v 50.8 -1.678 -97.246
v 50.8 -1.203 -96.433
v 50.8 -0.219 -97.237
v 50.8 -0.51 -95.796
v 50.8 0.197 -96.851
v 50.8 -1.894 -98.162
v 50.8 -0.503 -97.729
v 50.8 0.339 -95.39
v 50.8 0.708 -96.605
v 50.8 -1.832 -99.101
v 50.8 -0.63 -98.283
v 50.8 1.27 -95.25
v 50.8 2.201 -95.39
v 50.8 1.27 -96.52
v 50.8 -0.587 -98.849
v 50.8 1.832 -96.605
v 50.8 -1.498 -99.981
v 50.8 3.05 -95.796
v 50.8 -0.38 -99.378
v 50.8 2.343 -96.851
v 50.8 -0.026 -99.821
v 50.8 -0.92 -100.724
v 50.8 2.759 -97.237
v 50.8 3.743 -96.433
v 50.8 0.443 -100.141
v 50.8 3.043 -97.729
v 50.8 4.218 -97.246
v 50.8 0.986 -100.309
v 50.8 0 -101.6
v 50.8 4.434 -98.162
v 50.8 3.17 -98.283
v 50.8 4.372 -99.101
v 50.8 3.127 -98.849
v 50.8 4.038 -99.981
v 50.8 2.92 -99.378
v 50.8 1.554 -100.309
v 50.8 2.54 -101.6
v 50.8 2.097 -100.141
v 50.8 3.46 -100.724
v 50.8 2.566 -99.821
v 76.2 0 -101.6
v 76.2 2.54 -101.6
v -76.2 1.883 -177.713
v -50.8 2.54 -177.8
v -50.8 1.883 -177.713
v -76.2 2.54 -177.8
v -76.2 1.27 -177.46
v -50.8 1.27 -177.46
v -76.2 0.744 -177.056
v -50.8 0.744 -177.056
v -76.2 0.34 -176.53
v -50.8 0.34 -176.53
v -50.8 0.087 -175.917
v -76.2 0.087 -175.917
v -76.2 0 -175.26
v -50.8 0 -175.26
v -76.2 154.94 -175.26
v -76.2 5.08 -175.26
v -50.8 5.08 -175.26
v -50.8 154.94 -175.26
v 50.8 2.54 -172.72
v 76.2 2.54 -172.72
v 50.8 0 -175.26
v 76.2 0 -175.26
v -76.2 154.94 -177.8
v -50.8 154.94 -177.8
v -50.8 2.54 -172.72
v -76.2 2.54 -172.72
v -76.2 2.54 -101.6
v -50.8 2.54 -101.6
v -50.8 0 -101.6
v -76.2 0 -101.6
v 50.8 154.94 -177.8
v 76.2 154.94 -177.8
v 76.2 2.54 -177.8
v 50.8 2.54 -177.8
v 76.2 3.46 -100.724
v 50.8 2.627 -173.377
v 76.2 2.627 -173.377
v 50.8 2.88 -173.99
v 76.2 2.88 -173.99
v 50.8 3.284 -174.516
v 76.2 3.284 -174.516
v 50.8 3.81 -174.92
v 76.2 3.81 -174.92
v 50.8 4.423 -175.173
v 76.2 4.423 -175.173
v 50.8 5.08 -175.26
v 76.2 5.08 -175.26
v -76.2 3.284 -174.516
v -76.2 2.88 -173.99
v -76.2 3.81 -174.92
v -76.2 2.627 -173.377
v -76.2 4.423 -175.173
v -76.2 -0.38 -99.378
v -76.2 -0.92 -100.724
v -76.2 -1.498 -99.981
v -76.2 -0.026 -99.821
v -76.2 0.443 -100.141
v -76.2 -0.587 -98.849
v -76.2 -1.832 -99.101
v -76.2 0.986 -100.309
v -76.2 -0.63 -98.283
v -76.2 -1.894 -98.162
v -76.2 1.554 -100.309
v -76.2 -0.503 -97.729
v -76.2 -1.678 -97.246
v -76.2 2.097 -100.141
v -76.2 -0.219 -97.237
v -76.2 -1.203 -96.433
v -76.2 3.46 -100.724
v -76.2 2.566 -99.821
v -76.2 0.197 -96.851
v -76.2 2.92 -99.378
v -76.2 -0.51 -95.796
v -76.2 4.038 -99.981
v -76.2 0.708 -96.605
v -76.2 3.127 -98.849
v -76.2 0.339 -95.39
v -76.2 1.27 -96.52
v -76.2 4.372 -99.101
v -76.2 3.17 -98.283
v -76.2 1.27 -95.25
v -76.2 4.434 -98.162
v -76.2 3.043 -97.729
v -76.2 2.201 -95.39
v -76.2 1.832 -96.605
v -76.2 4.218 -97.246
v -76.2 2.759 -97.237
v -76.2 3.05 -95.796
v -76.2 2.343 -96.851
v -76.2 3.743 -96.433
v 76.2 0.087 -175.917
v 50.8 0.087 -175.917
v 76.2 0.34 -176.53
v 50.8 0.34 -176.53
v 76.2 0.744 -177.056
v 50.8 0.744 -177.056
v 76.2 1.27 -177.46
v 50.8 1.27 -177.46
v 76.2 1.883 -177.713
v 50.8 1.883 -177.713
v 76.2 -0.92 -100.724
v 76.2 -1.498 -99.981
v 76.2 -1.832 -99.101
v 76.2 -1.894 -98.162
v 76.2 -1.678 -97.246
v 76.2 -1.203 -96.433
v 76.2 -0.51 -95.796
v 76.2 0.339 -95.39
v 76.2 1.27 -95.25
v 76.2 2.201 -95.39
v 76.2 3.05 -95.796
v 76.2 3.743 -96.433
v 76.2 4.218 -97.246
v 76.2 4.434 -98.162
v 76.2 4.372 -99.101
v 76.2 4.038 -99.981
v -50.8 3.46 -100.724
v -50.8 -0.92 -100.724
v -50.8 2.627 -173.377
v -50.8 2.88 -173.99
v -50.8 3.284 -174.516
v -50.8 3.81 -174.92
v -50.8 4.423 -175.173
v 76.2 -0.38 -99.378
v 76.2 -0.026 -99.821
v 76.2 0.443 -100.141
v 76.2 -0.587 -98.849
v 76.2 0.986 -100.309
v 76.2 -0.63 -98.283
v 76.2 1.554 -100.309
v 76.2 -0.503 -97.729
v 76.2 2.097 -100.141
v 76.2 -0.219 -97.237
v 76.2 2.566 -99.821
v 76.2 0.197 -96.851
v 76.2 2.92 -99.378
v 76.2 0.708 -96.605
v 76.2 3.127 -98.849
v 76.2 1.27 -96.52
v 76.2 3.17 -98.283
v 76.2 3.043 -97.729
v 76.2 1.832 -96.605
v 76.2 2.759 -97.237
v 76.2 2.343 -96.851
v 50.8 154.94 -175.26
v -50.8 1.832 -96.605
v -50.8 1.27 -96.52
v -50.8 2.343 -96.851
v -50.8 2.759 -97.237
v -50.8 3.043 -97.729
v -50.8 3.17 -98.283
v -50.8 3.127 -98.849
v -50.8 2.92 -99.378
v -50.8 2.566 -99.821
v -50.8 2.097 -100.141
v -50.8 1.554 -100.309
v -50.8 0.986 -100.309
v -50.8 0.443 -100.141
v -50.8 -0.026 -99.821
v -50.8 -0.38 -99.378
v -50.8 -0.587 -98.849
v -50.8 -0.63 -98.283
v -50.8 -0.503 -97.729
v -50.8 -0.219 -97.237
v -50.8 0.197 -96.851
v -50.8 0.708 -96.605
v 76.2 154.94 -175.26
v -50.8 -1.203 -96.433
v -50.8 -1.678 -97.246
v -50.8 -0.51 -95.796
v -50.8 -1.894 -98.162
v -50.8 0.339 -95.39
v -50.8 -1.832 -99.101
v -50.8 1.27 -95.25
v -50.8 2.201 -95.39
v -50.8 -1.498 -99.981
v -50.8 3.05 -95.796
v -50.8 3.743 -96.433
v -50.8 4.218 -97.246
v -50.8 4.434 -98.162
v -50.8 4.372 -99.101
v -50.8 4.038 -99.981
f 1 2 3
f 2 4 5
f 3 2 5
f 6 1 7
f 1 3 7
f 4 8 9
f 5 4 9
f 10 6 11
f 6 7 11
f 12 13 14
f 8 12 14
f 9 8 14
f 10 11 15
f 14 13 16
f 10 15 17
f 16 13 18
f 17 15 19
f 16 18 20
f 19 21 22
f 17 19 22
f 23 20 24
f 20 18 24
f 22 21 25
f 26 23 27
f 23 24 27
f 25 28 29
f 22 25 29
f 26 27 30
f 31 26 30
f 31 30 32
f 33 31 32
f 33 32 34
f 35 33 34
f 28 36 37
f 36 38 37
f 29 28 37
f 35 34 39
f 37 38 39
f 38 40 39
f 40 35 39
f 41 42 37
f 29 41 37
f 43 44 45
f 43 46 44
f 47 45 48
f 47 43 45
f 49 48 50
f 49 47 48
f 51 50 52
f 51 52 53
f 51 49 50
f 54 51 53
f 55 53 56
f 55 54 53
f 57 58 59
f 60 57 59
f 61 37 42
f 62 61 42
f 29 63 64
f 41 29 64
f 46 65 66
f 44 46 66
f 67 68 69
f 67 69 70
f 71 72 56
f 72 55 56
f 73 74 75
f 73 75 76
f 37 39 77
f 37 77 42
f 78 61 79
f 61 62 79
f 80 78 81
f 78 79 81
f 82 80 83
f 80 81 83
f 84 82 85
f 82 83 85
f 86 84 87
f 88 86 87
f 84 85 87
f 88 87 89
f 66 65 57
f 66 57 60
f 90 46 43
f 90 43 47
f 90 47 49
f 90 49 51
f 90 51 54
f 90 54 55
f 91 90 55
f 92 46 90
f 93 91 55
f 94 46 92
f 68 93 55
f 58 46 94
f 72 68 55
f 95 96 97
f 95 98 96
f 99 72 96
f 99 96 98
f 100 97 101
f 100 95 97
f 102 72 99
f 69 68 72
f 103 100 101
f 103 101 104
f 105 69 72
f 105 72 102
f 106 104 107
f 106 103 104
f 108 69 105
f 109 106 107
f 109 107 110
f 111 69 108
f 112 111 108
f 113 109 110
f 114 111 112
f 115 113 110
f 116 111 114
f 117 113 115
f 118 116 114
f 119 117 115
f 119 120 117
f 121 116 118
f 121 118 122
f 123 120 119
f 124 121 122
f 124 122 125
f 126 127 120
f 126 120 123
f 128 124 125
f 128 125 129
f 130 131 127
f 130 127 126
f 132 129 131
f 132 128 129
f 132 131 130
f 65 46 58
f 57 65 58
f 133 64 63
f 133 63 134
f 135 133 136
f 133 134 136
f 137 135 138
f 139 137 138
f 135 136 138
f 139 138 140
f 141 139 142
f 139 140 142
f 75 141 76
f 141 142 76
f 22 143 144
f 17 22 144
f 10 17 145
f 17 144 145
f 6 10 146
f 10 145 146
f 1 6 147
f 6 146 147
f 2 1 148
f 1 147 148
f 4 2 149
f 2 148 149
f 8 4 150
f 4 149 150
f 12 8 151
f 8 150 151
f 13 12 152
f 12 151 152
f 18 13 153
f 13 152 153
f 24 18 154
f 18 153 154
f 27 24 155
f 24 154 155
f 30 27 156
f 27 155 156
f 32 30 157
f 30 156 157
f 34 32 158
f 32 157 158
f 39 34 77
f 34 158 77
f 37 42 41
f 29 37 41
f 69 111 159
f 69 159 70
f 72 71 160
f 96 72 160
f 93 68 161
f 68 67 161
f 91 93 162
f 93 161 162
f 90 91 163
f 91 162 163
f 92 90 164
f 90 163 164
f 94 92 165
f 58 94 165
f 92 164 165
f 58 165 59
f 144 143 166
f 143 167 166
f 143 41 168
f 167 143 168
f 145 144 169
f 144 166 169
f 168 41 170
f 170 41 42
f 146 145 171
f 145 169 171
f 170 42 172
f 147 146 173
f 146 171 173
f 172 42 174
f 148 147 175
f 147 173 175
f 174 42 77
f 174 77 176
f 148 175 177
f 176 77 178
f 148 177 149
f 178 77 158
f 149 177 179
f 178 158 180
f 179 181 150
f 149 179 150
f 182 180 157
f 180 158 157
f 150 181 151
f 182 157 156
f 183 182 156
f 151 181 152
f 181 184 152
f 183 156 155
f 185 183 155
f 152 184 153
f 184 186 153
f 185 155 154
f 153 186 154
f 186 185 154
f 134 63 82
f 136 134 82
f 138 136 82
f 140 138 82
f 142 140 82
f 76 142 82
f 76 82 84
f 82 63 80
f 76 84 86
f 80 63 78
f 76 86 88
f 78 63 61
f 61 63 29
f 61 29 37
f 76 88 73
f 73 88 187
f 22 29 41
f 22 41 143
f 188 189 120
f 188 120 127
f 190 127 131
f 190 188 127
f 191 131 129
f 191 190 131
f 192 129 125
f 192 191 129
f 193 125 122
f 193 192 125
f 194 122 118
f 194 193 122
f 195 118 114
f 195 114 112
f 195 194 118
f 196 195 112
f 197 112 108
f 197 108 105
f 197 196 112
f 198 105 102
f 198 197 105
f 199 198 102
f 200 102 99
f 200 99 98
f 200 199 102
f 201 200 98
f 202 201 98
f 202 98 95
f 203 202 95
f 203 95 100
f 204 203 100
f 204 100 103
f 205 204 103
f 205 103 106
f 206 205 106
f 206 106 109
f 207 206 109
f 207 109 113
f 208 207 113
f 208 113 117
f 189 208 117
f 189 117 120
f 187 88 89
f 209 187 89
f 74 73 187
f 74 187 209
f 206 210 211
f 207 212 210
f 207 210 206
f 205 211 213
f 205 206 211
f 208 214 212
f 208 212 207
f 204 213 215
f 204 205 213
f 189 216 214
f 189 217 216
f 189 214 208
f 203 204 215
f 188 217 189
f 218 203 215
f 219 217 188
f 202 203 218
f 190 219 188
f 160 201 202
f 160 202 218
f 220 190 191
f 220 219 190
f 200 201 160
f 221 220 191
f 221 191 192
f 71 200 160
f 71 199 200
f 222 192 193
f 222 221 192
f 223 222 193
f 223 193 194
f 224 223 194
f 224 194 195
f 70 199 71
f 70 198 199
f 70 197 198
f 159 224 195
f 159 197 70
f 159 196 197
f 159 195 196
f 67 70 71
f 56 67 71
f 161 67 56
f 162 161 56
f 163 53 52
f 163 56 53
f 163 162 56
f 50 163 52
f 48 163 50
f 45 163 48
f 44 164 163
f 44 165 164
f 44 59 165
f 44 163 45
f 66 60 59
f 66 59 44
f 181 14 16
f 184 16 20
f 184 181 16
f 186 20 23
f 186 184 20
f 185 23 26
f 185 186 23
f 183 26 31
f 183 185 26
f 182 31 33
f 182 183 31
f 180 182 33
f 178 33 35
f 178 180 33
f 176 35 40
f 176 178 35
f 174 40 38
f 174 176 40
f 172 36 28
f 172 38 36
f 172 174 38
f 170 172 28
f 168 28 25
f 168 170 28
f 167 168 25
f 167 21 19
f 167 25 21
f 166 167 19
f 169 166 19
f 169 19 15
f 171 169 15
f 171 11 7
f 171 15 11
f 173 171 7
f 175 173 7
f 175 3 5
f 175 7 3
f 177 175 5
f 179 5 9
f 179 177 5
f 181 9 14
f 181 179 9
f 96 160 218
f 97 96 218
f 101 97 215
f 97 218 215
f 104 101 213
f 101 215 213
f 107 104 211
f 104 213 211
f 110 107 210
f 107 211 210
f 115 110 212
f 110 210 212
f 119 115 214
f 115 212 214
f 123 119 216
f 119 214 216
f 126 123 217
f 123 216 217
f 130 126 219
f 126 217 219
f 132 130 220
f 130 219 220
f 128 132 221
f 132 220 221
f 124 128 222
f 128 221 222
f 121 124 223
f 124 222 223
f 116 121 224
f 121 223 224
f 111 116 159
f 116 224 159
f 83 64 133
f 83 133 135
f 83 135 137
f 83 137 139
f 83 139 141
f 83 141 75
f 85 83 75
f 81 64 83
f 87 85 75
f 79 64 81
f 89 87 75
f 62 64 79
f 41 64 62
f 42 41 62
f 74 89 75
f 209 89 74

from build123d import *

# Parameters (mm, degrees)
SKETCH1_W           = 533.4
SKETCH1_H           = 203.2
SKETCH1_W_2         = 482.6
SKETCH1_H_2         = 152.4
BOSS_EXTRUDE1_DEPTH = 2.54
FILLET1_R           = 2.54
SKETCH2_W           = 25.4
SKETCH2_H           = 2.54
BOSS_EXTRUDE2_DEPTH = 76.2
SKETCH3_W           = 25.4
SKETCH3_H           = 2.54
BOSS_EXTRUDE3_DEPTH = 152.4
FILLET2_R           = 2.54
FILLET3_R           = 2.54
CUT_EXTRUDE1_DEPTH  = 355.918990757
BOSS_EXTRUDE4_START = -152.4
SKETCH5_R           = 3.175
SKETCH5_R_2         = 1.905
BOSS_EXTRUDE4_DEPTH = 152.4
SKETCH6_W           = 101.6
SKETCH6_H           = 6.35
CUT_EXTRUDE2_DEPTH  = 12.7


with BuildPart() as part:
    # Sketch1 → Boss-Extrude1 (new body)
    with BuildSketch(Plane(origin=(0, 0, 0), x_dir=(1, 0, 0), z_dir=(0, 1, 0))):
        Rectangle(SKETCH1_W, SKETCH1_H)
        Rectangle(SKETCH1_W_2, SKETCH1_H_2, mode=Mode.SUBTRACT)
    extrude(amount=BOSS_EXTRUDE1_DEPTH)

    # Fillet1
    fillet1_edges = [part.edges().sort_by_distance(p)[0] for p in [
        (-266.7, 1.27, -101.6),
        (266.7, 1.27, -101.6),
        (266.7, 1.27, 101.6),
        (-266.7, 1.27, 101.6),
    ]]
    fillet(fillet1_edges, radius=FILLET1_R)

    # Sketch2 → Boss-Extrude2 (add)
    with BuildSketch(Plane(origin=(0, 0, -101.6), x_dir=(-1, 0, 0), z_dir=(0, 0, -1))):
        with Locations((63.5, 1.27)):
            Rectangle(SKETCH2_W, SKETCH2_H)
        with Locations((-63.5, 1.27)):
            Rectangle(SKETCH2_W, SKETCH2_H)
    extrude(amount=BOSS_EXTRUDE2_DEPTH)

    # Sketch3 → Boss-Extrude3 (add)
    with BuildSketch(Plane(origin=(0, 2.54, 0), x_dir=(1, 0, 0), z_dir=(0, 1, 0))):
        with Locations((-63.5, 176.53)):
            Rectangle(SKETCH3_W, SKETCH3_H)
        with Locations((63.5, 176.53)):
            Rectangle(SKETCH3_W, SKETCH3_H)
    extrude(amount=BOSS_EXTRUDE3_DEPTH)

    # Fillet2
    fillet2_edges = [part.edges().sort_by_distance(p)[0] for p in [
        (-63.5, 2.54, -175.26),
        (63.5, 2.54, -175.26),
    ]]
    fillet(fillet2_edges, radius=FILLET2_R)

    # Fillet3
    fillet3_edges = [part.edges().sort_by_distance(p)[0] for p in [
        (-63.5, 0, -177.8),
        (63.5, 0, -177.8),
    ]]
    fillet(fillet3_edges, radius=FILLET3_R)

    # Sketch4 → Cut-Extrude1 (cut, through all)
    with BuildSketch(Plane(origin=(0, 2.54, 0), x_dir=(1, 0, 0), z_dir=(0, 1, 0))):
        with BuildLine():
            Line((-264.16, -101.6), (264.16, -101.6))
            ThreePointArc((264.16, -101.6), (265.956051224, -100.856051224), (266.7, -99.06))
            Line((266.7, -99.06), (266.7, 99.06))
            ThreePointArc((266.7, 99.06), (265.956051224, 100.856051224), (264.16, 101.6))
            Line((264.16, 101.6), (76.2, 101.6))
            Line((76.2, 101.6), (50.8, 101.6))
            Line((50.8, 101.6), (-50.8, 101.6))
            Line((-50.8, 101.6), (-76.2, 101.6))
            Line((-76.2, 101.6), (-264.16, 101.6))
            ThreePointArc((-264.16, 101.6), (-265.956051224, 100.856051224), (-266.7, 99.06))
            Line((-266.7, 99.06), (-266.7, -99.06))
            ThreePointArc((-266.7, -99.06), (-265.956051224, -100.856051224), (-264.16, -101.6))
        make_face()
    extrude(amount=-CUT_EXTRUDE1_DEPTH, mode=Mode.SUBTRACT)


with BuildPart() as cut_extrude1_piece_1:
    # of the separate pieces the step leaves, piece 1, a body of its own (cut_extrude1_pieces)
    add(part.part.solids().sort_by_distance((-76.2, 0, -175.26))[0])

    # Sketch5 → Boss-Extrude4 (add)
    # profile 1 of 3: a face of its own
    with BuildSketch(Plane.ZY.offset(76.2).offset(BOSS_EXTRUDE4_START)):
        with Locations((-98.425, 1.27)):
            Circle(SKETCH5_R)
        with Locations((-98.425, 1.27)):
            Circle(SKETCH5_R_2, mode=Mode.SUBTRACT)
    # profile 2 of 3: a face of its own
    with BuildSketch(Plane.ZY.offset(76.2).offset(BOSS_EXTRUDE4_START)):
        with BuildLine():
            ThreePointArc((-100.724137931, -0.919655172), (-101.372913494, 0.090834603), (-101.6, 1.27))
            Line((-101.6, 1.27), (-101.6, 0))
            Line((-101.6, 0), (-100.724137931, -0.919655172))
        make_face()
    # profile 3 of 3: a face of its own
    with BuildSketch(Plane.ZY.offset(76.2).offset(BOSS_EXTRUDE4_START)):
        with BuildLine():
            Line((-100.724137931, 3.459655172), (-101.6, 2.54))
            Line((-101.6, 2.54), (-101.6, 1.27))
            ThreePointArc((-101.6, 1.27), (-101.372913494, 2.449165397), (-100.724137931, 3.459655172))
        make_face()
    boss_extrude4 = extrude(amount=BOSS_EXTRUDE4_DEPTH)

    # Mirror4: Boss-Extrude4 across plane
    add(boss_extrude4.mirror(Plane(origin=(0, 0, 0), x_dir=(0, 0, 1), z_dir=(1, 0, 0))))

    # Sketch6 → Cut-Extrude2 (cut, symmetric)
    with BuildSketch(Plane(origin=(0, 2.54, 0), x_dir=(1, 0, 0), z_dir=(0, 1, 0))):
        with Locations((0, 98.425)):
            Rectangle(SKETCH6_W, SKETCH6_H)
    extrude(amount=CUT_EXTRUDE2_DEPTH, both=True, mode=Mode.SUBTRACT)


with BuildPart() as cut_extrude1_piece_2:
    # of the separate pieces the step leaves, piece 2, a body of its own (cut_extrude1_pieces)
    add(part.part.solids().sort_by_distance((76.2, 0, -175.26))[0])


with BuildPart() as cut_extrude2_piece_1:
    # of the separate pieces the step leaves, piece 1, a body of its own (cut_extrude2_pieces)
    add(cut_extrude1_piece_1.part.solids().sort_by_distance((-50.8, -0.919655172, -100.724137931))[0])


with BuildPart() as cut_extrude2_piece_2:
    # of the separate pieces the step leaves, piece 2, a body of its own (cut_extrude2_pieces)
    add(cut_extrude1_piece_1.part.solids().sort_by_distance((76.2, -0.919655172, -100.724137931))[0])


solid = Compound([cut_extrude1_piece_2.part, cut_extrude2_piece_1.part, cut_extrude2_piece_2.part])
